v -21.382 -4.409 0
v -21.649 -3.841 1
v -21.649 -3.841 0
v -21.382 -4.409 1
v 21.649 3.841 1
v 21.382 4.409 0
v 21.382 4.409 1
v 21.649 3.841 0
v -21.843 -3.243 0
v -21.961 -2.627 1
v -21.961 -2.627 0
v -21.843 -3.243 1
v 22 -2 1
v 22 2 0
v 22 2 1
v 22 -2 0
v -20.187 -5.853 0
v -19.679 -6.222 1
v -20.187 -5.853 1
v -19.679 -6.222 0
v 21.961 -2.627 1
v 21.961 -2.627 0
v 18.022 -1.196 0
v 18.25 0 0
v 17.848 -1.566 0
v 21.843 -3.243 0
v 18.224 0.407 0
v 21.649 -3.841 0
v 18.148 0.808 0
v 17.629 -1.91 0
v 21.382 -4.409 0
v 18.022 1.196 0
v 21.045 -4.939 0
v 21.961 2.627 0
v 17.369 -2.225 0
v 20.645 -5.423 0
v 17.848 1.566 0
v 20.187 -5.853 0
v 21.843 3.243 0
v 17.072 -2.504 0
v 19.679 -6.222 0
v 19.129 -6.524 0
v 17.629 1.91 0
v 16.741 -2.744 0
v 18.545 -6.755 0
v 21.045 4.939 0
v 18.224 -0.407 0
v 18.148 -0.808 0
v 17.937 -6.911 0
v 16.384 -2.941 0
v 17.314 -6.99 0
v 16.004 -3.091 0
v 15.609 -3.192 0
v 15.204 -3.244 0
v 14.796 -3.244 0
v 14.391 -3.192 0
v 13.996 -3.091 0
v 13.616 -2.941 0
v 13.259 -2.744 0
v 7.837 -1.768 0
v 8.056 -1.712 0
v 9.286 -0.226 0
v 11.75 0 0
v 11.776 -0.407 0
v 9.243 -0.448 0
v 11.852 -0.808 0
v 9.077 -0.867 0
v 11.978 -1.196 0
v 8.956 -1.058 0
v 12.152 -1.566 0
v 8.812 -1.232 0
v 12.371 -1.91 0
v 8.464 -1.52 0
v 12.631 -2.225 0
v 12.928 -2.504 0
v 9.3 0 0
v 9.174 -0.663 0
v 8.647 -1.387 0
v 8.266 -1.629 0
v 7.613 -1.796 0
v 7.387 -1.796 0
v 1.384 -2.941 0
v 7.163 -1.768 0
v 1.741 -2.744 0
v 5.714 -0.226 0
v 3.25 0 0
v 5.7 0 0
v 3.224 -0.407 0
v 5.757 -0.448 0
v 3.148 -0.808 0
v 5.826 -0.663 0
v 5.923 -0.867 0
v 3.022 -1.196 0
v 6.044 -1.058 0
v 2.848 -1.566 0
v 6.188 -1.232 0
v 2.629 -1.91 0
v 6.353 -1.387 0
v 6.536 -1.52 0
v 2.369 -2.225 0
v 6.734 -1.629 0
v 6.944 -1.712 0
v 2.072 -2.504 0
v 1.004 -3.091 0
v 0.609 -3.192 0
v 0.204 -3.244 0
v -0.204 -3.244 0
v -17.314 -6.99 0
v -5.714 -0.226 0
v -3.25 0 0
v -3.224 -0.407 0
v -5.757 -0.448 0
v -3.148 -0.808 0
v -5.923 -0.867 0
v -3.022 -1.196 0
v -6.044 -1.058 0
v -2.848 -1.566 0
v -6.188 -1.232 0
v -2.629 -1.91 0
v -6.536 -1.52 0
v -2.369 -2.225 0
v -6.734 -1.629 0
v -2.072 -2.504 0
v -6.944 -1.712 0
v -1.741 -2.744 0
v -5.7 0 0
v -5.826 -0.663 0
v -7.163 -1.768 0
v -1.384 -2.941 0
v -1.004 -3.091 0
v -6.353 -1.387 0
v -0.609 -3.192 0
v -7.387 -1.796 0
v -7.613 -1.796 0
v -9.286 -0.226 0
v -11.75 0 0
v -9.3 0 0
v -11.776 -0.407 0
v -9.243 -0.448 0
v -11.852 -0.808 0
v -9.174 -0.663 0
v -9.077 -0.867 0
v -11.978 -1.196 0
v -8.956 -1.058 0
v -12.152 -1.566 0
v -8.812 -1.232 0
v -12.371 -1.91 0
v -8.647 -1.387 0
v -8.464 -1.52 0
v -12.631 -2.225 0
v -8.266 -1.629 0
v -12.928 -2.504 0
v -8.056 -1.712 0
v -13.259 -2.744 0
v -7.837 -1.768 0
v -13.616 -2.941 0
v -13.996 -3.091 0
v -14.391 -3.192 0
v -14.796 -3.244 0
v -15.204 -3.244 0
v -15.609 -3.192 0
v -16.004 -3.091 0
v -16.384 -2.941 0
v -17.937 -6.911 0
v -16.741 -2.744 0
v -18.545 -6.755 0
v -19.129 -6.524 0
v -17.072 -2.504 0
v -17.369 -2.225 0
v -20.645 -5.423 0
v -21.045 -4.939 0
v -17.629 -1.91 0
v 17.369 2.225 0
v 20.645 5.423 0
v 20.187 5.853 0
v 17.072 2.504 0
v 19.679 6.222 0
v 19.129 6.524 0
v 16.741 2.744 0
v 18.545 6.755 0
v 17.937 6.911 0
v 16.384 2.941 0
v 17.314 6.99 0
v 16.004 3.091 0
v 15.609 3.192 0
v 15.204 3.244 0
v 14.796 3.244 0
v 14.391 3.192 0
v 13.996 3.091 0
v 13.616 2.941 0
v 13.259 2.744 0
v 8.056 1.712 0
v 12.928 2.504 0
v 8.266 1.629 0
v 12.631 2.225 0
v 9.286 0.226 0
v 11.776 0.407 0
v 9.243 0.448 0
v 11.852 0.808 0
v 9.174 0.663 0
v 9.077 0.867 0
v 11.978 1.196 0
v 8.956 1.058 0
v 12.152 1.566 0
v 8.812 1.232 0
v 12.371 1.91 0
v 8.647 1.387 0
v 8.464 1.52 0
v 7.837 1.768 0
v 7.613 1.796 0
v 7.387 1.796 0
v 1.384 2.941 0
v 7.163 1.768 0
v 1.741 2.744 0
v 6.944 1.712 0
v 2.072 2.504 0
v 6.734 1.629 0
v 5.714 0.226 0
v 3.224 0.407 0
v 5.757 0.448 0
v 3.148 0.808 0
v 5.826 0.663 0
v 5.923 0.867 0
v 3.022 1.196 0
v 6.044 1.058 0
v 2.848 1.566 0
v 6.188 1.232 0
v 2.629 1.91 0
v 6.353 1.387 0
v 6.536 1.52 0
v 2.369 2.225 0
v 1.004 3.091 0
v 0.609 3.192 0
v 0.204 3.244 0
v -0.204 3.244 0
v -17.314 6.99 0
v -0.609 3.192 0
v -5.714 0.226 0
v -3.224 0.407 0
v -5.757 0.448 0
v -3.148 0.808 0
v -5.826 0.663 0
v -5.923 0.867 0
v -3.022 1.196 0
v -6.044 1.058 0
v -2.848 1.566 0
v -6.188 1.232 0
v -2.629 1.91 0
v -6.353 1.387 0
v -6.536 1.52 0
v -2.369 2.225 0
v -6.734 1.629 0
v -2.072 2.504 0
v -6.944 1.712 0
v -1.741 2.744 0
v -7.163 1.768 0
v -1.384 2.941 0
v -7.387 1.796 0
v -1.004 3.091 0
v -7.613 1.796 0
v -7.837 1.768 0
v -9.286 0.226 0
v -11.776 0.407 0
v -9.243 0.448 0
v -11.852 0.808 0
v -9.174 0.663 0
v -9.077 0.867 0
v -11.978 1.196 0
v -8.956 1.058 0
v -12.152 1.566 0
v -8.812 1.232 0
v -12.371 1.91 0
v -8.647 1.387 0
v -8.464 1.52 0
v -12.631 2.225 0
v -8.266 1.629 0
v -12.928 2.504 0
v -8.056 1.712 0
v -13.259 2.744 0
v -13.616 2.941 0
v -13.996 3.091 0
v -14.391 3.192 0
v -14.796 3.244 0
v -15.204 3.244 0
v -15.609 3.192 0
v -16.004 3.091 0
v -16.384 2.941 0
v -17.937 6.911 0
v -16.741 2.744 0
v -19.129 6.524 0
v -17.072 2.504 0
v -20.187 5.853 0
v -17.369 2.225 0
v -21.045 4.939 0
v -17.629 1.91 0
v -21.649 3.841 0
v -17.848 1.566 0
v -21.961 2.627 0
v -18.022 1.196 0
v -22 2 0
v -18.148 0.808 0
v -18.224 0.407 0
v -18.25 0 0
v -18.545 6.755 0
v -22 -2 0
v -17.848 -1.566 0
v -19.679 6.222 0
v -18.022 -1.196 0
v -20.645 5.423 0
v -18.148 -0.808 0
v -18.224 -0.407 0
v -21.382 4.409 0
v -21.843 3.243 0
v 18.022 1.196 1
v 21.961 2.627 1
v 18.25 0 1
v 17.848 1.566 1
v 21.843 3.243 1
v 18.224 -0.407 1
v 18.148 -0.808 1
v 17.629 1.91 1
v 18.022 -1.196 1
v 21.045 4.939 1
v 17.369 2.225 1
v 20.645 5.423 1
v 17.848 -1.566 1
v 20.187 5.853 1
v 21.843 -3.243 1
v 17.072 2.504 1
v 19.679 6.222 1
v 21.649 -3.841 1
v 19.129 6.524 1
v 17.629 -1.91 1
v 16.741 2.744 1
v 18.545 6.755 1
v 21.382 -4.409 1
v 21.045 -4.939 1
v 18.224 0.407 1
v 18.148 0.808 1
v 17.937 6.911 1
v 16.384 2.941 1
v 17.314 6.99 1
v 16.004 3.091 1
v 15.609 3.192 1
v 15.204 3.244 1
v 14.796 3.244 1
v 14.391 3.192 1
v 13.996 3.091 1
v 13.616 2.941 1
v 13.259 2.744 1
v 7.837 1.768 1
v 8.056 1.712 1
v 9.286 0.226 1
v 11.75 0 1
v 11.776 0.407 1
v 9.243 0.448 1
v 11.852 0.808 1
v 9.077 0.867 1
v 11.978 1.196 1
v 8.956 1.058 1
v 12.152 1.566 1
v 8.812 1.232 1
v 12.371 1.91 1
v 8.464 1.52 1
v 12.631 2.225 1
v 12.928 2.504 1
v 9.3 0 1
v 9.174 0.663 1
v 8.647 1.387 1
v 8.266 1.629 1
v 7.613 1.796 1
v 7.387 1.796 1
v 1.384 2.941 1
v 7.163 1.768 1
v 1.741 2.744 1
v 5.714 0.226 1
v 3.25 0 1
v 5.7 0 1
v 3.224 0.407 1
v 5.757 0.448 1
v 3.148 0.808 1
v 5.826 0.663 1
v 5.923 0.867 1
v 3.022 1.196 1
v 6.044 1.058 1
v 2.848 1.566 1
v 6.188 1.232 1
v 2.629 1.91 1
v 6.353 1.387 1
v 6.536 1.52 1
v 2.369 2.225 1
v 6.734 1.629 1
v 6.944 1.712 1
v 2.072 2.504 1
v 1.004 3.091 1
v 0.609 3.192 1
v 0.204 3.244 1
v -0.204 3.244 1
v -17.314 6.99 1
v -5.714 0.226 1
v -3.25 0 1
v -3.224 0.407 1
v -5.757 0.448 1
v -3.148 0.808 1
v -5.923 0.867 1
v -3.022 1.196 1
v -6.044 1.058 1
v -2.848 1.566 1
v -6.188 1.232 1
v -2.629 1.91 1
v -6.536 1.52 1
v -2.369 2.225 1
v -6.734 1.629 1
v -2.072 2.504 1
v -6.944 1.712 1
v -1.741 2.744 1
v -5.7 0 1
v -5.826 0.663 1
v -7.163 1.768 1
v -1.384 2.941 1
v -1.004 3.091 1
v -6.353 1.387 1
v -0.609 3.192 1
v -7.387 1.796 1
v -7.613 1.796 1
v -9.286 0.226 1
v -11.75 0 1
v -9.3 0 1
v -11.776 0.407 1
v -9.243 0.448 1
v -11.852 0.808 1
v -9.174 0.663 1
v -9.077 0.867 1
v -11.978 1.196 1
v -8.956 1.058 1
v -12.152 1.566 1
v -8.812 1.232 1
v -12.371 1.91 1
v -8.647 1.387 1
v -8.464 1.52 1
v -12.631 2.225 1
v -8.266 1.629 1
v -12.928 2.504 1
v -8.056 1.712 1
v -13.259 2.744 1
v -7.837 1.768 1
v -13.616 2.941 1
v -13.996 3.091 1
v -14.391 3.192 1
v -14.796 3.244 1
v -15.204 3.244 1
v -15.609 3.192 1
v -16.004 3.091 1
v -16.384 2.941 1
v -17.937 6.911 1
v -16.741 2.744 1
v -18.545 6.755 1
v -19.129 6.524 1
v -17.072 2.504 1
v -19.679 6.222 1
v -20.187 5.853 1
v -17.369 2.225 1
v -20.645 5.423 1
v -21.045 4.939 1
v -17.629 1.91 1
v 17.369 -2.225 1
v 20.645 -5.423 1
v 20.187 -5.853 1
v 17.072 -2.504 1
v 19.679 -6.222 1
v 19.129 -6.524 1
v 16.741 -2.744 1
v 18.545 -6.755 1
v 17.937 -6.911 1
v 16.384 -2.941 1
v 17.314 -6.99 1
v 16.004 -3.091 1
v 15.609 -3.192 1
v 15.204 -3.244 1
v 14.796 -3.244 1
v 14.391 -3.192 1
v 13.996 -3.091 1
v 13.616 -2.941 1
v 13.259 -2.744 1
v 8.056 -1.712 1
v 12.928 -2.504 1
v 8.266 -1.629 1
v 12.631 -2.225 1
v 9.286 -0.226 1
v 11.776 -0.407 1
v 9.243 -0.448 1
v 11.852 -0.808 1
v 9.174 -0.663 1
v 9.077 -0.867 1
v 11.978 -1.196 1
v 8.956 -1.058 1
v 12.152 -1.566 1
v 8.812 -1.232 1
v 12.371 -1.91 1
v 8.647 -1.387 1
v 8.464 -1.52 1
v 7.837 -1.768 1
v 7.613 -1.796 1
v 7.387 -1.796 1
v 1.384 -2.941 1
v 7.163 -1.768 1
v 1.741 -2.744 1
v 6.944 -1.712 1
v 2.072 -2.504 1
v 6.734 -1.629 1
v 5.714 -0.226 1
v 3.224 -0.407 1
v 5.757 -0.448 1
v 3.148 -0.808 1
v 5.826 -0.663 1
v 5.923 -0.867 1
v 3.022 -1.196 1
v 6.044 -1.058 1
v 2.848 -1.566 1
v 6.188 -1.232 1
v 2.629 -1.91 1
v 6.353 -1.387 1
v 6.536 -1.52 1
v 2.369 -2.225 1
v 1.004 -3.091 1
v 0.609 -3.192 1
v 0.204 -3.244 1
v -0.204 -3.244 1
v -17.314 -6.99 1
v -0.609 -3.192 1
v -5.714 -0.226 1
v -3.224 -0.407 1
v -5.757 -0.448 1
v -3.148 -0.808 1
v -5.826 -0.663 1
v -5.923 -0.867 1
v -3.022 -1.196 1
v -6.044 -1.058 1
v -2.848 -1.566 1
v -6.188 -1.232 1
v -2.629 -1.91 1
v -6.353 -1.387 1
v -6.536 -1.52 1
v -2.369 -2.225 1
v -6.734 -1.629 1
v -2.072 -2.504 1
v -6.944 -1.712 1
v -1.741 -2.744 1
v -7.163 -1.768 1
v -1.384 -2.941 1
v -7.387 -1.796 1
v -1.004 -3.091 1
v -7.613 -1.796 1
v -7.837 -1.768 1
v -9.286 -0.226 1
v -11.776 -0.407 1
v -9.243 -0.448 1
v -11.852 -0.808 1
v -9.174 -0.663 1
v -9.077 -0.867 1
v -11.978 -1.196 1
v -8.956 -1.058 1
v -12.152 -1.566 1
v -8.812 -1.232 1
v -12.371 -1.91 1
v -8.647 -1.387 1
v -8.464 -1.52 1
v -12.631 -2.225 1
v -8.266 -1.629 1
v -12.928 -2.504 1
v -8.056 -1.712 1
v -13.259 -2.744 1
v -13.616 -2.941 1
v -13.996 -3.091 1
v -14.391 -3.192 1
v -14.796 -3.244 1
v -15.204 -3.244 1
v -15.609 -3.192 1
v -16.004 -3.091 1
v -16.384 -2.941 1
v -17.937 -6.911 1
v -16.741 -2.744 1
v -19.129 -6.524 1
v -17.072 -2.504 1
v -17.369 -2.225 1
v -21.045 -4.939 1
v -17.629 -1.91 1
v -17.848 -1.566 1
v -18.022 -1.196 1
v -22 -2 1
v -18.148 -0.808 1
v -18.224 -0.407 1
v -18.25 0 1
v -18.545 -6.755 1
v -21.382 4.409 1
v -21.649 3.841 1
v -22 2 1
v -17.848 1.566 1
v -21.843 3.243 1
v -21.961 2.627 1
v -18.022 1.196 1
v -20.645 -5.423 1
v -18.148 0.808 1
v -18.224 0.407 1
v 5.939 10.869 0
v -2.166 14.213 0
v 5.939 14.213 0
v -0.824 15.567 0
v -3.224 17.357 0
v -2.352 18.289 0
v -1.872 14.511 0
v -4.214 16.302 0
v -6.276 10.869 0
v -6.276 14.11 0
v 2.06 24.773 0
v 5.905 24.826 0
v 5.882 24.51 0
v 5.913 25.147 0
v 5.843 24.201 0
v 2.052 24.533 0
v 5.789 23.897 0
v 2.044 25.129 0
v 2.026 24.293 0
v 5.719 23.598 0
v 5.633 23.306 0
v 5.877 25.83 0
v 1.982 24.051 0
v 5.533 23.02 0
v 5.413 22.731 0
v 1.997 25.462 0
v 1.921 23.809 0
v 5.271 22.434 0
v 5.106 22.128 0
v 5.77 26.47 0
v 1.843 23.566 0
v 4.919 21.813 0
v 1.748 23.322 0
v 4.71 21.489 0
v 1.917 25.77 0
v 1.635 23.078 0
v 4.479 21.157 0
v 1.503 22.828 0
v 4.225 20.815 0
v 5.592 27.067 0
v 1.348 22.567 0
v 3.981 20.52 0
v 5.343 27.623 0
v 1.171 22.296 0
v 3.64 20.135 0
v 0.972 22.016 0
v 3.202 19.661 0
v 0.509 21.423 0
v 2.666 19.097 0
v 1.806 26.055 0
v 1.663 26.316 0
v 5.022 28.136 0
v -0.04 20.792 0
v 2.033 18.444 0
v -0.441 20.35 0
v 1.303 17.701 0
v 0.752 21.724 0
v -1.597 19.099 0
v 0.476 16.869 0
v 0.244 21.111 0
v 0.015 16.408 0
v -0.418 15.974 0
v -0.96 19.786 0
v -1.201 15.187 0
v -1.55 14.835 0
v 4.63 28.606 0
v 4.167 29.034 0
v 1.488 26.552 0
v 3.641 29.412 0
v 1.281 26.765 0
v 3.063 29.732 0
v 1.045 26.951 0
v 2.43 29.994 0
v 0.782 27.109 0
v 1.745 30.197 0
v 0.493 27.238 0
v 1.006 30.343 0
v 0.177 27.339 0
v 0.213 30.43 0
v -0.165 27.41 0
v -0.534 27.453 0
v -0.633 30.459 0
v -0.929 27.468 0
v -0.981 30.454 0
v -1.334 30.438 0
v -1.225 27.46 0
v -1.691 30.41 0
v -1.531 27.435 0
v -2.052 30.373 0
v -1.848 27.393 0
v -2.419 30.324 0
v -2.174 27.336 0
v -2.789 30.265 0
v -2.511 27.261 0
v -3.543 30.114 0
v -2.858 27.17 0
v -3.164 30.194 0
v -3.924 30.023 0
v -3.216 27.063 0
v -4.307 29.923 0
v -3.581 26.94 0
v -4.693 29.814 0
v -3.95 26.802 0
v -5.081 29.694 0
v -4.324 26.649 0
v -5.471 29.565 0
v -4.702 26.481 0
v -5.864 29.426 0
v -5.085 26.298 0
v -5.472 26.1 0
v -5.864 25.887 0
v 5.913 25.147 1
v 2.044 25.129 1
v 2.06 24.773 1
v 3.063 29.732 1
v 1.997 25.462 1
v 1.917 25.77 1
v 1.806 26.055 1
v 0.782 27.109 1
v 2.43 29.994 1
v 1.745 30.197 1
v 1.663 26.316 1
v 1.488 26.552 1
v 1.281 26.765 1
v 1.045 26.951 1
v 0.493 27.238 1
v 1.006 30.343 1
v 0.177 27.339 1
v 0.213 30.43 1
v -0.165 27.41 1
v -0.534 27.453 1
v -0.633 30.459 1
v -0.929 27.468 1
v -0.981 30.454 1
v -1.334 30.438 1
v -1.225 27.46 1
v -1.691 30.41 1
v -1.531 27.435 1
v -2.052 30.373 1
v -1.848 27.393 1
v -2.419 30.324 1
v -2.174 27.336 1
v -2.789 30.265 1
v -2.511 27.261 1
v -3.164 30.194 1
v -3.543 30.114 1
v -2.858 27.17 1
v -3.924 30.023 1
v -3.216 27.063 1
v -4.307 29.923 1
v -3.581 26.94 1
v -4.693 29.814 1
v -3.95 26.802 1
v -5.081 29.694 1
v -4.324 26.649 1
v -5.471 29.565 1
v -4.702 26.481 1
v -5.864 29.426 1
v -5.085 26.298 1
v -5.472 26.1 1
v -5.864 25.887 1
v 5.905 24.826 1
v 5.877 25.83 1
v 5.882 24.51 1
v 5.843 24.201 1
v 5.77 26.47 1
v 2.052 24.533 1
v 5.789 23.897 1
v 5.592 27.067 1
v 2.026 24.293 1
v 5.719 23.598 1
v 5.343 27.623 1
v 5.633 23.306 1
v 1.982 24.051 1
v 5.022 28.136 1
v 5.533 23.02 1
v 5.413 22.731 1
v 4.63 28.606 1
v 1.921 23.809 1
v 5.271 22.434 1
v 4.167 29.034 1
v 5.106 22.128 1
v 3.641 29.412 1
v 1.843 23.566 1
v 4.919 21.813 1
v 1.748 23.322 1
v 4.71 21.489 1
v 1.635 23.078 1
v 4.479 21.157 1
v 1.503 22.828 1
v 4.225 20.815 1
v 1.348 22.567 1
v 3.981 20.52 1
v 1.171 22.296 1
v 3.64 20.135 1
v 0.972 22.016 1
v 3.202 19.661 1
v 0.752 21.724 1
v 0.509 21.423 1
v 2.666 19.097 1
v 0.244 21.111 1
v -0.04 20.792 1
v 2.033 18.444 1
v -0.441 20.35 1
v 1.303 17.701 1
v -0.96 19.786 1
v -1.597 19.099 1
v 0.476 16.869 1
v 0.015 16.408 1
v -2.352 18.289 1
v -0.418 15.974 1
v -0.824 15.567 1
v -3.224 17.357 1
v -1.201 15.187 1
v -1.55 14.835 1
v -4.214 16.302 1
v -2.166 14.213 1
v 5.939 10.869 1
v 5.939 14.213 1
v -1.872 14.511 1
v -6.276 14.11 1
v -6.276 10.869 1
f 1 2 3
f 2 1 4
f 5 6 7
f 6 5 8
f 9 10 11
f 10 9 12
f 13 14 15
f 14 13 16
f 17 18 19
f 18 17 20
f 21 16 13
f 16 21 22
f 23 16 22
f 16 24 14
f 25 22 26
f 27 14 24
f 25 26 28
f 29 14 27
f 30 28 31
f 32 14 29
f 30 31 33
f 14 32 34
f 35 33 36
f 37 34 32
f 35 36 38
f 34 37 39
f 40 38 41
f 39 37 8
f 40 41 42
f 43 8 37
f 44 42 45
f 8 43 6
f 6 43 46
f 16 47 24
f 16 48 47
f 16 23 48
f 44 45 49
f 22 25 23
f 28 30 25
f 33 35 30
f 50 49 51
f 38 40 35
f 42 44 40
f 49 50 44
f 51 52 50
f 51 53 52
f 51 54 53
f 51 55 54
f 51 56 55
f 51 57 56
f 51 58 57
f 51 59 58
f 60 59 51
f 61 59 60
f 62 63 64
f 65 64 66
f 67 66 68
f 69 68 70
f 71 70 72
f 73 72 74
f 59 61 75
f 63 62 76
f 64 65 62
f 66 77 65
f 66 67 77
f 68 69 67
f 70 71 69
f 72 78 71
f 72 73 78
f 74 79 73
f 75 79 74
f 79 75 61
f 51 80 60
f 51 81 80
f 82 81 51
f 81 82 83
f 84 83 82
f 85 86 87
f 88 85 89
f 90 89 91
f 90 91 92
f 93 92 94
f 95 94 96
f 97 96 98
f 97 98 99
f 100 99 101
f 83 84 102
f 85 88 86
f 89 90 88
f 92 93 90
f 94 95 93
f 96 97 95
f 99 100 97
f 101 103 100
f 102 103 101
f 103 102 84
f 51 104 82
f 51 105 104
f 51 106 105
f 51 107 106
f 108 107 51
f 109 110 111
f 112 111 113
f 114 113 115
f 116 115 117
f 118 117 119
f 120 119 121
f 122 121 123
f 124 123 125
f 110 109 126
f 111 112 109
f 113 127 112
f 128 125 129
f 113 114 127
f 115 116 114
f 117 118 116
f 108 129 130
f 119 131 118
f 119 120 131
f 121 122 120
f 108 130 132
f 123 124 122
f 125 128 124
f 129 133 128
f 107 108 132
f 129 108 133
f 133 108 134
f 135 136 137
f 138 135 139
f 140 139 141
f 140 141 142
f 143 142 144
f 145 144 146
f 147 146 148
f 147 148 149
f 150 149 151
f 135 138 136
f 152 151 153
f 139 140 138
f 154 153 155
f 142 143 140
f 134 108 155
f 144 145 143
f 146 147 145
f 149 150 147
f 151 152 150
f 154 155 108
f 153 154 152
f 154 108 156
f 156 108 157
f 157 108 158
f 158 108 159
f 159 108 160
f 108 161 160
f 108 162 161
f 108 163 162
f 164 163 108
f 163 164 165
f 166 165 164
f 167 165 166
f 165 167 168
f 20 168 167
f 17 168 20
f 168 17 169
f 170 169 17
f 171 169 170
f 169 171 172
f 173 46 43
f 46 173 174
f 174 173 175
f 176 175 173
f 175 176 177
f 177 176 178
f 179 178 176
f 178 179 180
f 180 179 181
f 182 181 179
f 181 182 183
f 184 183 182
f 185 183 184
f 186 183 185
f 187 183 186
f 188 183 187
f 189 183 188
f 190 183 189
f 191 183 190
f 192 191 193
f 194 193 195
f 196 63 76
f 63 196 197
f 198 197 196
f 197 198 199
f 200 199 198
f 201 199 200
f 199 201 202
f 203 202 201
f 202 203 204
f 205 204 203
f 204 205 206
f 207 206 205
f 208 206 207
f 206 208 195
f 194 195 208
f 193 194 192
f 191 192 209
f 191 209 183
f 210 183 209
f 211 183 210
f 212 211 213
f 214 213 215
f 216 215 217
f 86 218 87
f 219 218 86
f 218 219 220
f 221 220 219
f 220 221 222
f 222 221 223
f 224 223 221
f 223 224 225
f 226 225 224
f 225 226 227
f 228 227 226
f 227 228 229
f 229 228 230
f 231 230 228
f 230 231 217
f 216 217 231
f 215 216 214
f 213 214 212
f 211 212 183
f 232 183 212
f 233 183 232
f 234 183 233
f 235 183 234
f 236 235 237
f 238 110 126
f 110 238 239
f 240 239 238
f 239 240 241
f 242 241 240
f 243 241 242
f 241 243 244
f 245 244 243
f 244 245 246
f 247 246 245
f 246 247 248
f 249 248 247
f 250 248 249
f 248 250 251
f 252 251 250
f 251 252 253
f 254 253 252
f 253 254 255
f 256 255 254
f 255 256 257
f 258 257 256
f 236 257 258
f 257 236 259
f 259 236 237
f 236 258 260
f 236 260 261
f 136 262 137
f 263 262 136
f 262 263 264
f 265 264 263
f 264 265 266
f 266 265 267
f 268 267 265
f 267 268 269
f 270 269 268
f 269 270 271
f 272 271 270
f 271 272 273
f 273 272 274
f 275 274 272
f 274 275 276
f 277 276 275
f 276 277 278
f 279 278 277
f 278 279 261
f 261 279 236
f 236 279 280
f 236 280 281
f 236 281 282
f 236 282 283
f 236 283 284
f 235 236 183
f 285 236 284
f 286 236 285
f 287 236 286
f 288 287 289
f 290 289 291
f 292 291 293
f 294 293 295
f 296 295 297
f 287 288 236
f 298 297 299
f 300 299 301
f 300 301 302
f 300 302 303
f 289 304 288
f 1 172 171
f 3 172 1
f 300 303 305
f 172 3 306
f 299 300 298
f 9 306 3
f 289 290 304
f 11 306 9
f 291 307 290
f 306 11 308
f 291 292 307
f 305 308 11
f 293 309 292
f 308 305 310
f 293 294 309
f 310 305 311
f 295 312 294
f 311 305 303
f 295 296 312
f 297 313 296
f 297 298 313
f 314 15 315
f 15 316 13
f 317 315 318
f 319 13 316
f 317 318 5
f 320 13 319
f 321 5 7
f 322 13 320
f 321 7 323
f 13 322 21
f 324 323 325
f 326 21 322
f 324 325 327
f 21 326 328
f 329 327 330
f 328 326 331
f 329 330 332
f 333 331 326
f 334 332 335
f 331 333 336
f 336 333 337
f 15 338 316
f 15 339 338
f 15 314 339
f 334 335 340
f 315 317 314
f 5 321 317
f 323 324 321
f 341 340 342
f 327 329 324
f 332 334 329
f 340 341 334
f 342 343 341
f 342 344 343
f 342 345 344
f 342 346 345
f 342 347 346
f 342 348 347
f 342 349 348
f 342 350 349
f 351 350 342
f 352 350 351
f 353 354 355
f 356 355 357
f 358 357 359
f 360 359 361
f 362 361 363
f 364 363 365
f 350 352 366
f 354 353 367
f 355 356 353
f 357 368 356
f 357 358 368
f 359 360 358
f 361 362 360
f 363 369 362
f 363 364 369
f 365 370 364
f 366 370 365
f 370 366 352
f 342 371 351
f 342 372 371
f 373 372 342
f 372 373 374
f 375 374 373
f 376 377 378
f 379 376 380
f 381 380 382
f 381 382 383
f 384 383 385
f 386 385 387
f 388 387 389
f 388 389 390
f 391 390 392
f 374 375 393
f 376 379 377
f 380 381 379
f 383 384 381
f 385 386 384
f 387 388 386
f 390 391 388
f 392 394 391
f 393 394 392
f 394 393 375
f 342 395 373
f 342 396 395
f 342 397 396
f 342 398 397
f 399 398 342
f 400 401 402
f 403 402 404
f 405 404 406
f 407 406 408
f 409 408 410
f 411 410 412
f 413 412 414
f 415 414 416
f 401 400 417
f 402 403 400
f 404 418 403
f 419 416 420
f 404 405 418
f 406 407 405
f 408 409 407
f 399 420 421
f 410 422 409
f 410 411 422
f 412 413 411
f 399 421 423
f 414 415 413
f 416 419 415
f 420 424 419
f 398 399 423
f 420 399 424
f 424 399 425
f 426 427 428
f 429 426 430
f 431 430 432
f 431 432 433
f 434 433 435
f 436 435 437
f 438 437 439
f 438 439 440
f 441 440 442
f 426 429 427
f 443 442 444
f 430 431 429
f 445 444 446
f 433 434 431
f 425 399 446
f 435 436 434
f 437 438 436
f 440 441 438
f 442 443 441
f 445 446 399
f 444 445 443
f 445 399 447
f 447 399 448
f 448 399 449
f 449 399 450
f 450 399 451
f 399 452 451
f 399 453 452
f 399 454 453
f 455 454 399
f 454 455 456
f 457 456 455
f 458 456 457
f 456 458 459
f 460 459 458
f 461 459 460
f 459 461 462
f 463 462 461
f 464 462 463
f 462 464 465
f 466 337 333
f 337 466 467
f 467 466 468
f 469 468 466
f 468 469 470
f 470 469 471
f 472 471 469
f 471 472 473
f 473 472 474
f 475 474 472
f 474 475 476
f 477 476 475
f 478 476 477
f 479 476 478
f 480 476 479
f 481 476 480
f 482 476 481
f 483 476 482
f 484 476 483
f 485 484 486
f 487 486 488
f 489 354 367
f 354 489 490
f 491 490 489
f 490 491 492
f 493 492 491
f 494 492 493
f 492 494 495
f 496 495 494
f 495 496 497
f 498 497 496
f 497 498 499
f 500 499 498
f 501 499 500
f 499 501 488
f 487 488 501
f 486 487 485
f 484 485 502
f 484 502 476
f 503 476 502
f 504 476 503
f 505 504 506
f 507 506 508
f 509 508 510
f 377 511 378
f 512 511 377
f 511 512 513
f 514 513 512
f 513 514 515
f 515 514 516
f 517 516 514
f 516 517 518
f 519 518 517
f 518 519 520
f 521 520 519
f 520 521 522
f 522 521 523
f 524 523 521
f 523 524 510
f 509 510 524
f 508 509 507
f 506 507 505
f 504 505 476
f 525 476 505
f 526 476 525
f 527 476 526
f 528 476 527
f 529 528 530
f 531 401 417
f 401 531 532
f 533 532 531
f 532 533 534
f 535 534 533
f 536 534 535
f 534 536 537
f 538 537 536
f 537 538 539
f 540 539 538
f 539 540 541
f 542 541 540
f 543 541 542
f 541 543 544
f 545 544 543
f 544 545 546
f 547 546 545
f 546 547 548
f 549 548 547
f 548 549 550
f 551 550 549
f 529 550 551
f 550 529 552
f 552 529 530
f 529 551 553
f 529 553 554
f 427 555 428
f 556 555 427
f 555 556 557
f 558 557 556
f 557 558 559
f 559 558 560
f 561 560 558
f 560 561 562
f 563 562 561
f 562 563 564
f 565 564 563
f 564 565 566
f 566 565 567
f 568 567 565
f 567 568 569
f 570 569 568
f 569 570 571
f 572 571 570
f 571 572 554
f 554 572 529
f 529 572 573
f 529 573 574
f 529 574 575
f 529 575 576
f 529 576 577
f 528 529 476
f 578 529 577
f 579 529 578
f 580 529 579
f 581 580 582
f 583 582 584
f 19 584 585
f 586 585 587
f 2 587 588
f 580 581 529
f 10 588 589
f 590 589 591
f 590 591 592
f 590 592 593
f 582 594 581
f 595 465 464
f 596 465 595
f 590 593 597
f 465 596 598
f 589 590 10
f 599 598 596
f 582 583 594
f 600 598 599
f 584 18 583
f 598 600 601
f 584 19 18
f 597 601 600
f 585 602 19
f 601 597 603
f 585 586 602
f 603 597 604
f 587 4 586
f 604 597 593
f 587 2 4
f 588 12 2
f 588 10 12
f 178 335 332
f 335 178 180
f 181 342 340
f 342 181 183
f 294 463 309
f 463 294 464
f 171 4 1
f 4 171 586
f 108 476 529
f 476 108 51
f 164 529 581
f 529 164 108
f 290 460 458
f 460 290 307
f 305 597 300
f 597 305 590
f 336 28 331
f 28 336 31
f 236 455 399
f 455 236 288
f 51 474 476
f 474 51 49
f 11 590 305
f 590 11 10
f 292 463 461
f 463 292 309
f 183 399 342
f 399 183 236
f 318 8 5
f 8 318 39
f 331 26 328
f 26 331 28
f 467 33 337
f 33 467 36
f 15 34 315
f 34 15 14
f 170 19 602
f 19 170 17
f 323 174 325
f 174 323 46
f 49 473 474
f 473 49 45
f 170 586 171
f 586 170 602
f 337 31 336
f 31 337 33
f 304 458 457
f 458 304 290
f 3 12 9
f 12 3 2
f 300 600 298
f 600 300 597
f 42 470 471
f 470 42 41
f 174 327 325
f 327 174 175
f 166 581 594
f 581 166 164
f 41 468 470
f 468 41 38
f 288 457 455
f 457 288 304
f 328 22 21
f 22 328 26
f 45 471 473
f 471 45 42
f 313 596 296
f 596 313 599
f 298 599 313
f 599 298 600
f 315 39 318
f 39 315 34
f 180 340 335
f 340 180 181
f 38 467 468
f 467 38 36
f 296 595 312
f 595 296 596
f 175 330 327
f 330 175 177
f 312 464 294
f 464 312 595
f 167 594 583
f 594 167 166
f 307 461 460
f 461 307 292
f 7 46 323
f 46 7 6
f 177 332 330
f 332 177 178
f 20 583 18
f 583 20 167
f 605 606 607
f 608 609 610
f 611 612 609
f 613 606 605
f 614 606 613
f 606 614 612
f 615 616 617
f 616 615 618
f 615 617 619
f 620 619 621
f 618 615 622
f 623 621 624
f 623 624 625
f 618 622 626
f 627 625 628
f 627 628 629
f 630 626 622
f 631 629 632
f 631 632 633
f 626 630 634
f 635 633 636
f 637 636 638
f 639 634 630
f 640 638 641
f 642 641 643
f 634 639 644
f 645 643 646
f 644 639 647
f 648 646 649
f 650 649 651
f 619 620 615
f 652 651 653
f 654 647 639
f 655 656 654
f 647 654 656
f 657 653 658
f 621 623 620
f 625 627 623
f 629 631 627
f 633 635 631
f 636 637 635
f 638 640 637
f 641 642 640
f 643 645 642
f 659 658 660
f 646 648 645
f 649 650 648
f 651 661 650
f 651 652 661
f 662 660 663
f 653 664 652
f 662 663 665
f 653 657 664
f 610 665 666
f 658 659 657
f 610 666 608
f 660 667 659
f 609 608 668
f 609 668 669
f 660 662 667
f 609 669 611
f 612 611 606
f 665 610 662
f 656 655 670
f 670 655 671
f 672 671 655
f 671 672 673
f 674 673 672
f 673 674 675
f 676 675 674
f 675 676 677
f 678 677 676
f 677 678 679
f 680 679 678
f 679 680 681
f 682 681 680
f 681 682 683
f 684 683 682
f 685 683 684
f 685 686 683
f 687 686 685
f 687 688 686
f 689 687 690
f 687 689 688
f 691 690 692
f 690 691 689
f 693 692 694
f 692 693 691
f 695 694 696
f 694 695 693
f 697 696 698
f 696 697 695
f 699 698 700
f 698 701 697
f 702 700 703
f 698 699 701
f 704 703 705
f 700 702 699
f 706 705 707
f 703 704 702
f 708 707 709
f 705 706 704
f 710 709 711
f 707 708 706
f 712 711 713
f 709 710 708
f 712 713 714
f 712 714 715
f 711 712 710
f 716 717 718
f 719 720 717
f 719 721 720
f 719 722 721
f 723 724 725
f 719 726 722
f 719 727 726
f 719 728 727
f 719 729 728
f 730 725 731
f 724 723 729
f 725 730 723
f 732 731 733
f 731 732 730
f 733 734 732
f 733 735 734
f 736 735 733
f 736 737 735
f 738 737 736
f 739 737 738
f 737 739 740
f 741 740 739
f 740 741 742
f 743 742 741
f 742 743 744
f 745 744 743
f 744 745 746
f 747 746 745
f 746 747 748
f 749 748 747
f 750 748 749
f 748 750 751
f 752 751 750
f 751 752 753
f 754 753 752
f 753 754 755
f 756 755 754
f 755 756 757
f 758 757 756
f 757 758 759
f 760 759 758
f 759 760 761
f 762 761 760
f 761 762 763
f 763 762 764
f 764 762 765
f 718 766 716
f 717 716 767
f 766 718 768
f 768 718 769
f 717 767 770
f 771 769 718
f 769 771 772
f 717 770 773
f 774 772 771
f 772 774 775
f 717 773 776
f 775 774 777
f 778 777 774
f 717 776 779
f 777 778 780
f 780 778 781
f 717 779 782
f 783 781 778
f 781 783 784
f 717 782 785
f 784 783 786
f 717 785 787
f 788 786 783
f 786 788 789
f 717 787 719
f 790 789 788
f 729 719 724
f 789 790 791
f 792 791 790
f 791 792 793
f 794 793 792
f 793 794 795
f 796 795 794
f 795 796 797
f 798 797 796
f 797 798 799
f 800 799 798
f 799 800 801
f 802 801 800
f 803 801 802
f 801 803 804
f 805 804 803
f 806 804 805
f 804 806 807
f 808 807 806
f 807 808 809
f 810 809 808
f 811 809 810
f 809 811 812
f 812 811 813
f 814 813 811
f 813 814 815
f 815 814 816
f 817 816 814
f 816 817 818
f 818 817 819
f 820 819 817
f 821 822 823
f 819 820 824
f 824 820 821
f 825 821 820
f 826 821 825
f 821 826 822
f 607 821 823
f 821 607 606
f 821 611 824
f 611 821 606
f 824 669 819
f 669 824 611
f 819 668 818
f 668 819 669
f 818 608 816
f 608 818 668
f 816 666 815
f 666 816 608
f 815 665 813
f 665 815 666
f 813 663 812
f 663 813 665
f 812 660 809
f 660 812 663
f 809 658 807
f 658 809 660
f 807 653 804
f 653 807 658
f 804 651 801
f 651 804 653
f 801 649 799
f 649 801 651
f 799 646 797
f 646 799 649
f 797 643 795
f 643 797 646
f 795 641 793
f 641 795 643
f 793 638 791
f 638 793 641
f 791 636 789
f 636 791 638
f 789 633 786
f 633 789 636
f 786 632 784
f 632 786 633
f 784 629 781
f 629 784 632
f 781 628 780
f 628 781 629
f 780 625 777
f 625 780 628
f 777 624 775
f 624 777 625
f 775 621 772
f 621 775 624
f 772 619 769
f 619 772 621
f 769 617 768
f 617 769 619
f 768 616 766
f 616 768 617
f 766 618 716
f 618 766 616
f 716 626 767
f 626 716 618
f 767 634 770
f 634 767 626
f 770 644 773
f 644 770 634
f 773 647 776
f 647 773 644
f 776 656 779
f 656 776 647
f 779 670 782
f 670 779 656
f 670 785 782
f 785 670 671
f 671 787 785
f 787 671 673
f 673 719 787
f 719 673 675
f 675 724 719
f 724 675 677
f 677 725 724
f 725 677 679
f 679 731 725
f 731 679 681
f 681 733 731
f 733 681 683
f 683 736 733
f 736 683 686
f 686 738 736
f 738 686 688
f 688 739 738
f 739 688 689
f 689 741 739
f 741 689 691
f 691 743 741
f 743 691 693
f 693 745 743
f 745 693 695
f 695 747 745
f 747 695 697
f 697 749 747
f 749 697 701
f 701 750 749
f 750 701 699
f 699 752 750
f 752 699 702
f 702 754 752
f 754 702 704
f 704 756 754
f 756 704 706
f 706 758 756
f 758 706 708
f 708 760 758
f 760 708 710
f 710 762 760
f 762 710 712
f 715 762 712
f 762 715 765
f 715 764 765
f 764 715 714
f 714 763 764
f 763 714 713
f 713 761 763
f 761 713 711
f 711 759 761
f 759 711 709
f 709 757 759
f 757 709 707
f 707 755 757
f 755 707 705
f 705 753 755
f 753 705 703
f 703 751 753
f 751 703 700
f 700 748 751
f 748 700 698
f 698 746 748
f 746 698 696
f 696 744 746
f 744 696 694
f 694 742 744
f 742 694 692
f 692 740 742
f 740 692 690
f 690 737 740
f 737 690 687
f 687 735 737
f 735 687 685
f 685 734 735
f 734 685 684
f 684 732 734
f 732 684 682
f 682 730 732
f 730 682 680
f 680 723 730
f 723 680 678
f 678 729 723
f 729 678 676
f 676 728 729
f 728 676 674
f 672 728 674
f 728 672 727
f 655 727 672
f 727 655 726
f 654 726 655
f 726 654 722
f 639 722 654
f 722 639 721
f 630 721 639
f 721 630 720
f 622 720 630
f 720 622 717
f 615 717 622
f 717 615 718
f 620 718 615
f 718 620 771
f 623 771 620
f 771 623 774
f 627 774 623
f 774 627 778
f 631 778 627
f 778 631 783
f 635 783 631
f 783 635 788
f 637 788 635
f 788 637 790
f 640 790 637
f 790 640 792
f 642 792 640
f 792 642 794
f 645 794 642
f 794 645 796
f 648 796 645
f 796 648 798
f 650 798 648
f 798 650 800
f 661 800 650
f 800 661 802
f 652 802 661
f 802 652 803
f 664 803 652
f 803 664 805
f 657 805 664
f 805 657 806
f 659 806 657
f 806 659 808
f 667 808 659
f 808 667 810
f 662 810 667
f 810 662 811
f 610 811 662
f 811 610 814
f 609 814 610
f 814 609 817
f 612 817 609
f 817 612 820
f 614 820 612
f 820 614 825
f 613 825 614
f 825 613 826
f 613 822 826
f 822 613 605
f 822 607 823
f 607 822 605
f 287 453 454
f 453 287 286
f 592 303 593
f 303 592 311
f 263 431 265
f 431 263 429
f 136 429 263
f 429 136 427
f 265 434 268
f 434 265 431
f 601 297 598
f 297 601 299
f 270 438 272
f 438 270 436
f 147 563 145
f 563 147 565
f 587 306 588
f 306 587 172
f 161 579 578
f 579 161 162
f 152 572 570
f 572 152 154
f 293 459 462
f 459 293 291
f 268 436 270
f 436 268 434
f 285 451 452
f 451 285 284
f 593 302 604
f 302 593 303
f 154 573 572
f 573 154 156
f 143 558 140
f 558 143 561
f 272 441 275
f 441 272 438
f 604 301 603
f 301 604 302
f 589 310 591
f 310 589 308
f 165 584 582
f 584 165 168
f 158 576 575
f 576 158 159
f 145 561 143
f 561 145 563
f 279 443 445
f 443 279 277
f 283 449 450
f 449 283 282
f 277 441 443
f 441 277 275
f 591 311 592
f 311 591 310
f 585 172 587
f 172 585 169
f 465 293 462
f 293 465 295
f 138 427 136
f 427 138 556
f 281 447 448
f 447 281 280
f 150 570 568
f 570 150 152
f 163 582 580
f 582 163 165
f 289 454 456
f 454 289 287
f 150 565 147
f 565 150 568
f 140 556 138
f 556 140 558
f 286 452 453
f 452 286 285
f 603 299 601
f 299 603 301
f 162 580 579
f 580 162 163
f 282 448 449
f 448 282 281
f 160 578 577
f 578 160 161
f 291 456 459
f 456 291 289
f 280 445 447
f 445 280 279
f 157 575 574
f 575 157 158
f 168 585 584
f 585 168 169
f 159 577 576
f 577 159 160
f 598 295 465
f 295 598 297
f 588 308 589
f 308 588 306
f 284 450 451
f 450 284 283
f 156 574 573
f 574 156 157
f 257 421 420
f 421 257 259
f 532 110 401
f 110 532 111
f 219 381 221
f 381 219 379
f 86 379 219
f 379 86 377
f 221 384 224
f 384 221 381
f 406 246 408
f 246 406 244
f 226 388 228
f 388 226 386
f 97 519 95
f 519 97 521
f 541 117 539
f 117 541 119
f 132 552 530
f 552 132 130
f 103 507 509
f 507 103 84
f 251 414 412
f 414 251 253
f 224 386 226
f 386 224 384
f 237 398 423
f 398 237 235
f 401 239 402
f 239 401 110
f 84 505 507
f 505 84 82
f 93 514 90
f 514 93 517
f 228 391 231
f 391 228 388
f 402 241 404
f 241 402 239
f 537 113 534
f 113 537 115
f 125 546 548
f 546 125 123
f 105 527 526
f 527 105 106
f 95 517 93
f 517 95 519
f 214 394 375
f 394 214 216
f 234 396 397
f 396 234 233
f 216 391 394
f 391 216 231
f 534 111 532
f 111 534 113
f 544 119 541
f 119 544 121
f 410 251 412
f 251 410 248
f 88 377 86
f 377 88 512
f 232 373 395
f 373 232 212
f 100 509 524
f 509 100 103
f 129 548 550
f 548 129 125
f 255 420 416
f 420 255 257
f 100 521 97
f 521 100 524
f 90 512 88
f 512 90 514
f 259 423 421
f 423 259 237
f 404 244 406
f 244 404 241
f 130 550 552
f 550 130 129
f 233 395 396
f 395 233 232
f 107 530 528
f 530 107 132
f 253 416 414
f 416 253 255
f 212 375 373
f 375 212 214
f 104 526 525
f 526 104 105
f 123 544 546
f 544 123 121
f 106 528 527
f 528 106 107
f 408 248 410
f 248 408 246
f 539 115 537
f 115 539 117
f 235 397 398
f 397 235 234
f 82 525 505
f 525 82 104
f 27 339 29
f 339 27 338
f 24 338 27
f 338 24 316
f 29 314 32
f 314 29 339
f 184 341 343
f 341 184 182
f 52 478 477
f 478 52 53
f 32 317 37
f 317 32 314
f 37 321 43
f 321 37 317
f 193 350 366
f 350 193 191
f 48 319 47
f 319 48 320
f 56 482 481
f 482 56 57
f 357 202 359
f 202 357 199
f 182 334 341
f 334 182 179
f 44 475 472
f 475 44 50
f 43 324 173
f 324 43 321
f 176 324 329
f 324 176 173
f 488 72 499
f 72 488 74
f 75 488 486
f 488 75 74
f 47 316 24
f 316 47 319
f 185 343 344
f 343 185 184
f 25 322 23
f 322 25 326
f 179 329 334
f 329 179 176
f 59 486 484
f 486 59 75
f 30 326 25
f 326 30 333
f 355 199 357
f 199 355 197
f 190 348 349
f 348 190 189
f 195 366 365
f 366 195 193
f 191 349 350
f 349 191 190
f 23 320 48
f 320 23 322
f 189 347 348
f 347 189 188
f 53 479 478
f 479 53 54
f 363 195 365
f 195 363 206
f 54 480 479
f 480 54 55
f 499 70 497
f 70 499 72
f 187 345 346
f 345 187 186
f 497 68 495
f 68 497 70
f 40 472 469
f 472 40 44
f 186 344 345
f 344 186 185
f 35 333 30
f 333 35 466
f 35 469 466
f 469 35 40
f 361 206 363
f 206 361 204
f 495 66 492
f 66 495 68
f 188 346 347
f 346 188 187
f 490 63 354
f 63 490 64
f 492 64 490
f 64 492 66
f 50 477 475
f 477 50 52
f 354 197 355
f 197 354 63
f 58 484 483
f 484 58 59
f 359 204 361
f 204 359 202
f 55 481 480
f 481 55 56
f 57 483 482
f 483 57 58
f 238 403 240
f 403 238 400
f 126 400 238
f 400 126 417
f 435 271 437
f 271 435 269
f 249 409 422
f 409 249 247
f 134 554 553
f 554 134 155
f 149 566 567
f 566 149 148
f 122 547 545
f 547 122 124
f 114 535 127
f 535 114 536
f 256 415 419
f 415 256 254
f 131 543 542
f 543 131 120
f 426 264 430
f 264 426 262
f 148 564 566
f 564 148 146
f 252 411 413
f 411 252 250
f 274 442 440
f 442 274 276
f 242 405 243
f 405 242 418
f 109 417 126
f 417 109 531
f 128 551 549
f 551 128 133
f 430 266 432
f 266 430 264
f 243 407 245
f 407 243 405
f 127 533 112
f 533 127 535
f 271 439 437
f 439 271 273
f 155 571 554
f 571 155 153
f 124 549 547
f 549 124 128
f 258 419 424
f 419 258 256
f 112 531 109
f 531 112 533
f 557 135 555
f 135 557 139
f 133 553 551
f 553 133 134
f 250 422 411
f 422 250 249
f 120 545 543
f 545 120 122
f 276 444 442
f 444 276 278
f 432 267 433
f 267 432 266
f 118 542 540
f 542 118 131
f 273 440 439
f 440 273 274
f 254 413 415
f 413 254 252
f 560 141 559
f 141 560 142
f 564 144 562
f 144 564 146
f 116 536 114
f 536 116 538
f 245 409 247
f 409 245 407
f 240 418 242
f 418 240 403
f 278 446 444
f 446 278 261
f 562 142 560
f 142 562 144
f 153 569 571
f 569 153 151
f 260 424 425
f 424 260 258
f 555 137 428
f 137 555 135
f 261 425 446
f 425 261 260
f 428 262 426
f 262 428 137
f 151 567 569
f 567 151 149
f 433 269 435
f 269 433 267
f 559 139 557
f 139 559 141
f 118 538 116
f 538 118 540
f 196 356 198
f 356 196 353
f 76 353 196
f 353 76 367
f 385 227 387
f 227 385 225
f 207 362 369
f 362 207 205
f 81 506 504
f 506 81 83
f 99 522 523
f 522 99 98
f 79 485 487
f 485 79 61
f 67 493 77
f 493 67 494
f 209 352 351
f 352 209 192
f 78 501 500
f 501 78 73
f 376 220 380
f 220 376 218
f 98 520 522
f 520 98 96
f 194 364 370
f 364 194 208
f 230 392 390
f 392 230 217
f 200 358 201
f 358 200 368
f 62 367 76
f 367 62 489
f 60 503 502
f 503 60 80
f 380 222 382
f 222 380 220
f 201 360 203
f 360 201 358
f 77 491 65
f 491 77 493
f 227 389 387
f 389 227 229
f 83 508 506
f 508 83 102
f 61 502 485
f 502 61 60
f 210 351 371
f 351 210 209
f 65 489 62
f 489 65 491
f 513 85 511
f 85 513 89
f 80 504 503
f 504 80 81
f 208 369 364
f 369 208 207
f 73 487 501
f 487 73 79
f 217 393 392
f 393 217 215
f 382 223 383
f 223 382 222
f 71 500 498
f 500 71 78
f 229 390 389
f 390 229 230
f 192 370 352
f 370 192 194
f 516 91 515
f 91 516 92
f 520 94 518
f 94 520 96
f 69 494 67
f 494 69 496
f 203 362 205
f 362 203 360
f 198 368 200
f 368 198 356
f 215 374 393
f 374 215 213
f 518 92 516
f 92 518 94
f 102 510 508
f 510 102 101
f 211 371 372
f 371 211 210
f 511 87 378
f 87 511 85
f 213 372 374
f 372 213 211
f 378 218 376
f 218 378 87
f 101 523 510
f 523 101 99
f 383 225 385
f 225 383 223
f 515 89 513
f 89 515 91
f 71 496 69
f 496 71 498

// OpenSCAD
$fn = 50;


difference() {
	union() {
		hull() {
			translate(v = [-17.0000000000, 2.0000000000, 0]) {
				cylinder(h = 1, r = 5);
			}
			translate(v = [17.0000000000, 2.0000000000, 0]) {
				cylinder(h = 1, r = 5);
			}
			translate(v = [-17.0000000000, -2.0000000000, 0]) {
				cylinder(h = 1, r = 5);
			}
			translate(v = [17.0000000000, -2.0000000000, 0]) {
				cylinder(h = 1, r = 5);
			}
		}
		translate(v = [0, 30.0000000000, 0]) {
			linear_extrude(height = 1) {
				text(font = "DejaVu Sans Mono:style=Bold", halign = "center", size = 19.0000000000, text = "2", valign = "top");
			}
		}
	}
	union() {
		translate(v = [-15.0000000000, 0.0000000000, 0]) {
			translate(v = [0, 0, -100]) {
				cylinder(h = 200, r = 3.2500000000);
			}
		}
		translate(v = [0, 0, -100]) {
			cylinder(h = 200, r = 3.2500000000);
		}
		translate(v = [15.0000000000, 0.0000000000, 0]) {
			translate(v = [0, 0, -100]) {
				cylinder(h = 200, r = 3.2500000000);
			}
		}
		translate(v = [-15.0000000000, 0.0000000000, 0]) {
			translate(v = [0, 0, -100]) {
				cylinder(h = 200, r = 1.8000000000);
			}
		}
		translate(v = [-7.5000000000, 0.0000000000, 0]) {
			translate(v = [0, 0, -100]) {
				cylinder(h = 200, r = 1.8000000000);
			}
		}
		translate(v = [0, 0, -100]) {
			cylinder(h = 200, r = 1.8000000000);
		}
		translate(v = [7.5000000000, 0.0000000000, 0]) {
			translate(v = [0, 0, -100]) {
				cylinder(h = 200, r = 1.8000000000);
			}
		}
		translate(v = [15.0000000000, 0.0000000000, 0]) {
			translate(v = [0, 0, -100]) {
				cylinder(h = 200, r = 1.8000000000);
			}
		}
	}
}
